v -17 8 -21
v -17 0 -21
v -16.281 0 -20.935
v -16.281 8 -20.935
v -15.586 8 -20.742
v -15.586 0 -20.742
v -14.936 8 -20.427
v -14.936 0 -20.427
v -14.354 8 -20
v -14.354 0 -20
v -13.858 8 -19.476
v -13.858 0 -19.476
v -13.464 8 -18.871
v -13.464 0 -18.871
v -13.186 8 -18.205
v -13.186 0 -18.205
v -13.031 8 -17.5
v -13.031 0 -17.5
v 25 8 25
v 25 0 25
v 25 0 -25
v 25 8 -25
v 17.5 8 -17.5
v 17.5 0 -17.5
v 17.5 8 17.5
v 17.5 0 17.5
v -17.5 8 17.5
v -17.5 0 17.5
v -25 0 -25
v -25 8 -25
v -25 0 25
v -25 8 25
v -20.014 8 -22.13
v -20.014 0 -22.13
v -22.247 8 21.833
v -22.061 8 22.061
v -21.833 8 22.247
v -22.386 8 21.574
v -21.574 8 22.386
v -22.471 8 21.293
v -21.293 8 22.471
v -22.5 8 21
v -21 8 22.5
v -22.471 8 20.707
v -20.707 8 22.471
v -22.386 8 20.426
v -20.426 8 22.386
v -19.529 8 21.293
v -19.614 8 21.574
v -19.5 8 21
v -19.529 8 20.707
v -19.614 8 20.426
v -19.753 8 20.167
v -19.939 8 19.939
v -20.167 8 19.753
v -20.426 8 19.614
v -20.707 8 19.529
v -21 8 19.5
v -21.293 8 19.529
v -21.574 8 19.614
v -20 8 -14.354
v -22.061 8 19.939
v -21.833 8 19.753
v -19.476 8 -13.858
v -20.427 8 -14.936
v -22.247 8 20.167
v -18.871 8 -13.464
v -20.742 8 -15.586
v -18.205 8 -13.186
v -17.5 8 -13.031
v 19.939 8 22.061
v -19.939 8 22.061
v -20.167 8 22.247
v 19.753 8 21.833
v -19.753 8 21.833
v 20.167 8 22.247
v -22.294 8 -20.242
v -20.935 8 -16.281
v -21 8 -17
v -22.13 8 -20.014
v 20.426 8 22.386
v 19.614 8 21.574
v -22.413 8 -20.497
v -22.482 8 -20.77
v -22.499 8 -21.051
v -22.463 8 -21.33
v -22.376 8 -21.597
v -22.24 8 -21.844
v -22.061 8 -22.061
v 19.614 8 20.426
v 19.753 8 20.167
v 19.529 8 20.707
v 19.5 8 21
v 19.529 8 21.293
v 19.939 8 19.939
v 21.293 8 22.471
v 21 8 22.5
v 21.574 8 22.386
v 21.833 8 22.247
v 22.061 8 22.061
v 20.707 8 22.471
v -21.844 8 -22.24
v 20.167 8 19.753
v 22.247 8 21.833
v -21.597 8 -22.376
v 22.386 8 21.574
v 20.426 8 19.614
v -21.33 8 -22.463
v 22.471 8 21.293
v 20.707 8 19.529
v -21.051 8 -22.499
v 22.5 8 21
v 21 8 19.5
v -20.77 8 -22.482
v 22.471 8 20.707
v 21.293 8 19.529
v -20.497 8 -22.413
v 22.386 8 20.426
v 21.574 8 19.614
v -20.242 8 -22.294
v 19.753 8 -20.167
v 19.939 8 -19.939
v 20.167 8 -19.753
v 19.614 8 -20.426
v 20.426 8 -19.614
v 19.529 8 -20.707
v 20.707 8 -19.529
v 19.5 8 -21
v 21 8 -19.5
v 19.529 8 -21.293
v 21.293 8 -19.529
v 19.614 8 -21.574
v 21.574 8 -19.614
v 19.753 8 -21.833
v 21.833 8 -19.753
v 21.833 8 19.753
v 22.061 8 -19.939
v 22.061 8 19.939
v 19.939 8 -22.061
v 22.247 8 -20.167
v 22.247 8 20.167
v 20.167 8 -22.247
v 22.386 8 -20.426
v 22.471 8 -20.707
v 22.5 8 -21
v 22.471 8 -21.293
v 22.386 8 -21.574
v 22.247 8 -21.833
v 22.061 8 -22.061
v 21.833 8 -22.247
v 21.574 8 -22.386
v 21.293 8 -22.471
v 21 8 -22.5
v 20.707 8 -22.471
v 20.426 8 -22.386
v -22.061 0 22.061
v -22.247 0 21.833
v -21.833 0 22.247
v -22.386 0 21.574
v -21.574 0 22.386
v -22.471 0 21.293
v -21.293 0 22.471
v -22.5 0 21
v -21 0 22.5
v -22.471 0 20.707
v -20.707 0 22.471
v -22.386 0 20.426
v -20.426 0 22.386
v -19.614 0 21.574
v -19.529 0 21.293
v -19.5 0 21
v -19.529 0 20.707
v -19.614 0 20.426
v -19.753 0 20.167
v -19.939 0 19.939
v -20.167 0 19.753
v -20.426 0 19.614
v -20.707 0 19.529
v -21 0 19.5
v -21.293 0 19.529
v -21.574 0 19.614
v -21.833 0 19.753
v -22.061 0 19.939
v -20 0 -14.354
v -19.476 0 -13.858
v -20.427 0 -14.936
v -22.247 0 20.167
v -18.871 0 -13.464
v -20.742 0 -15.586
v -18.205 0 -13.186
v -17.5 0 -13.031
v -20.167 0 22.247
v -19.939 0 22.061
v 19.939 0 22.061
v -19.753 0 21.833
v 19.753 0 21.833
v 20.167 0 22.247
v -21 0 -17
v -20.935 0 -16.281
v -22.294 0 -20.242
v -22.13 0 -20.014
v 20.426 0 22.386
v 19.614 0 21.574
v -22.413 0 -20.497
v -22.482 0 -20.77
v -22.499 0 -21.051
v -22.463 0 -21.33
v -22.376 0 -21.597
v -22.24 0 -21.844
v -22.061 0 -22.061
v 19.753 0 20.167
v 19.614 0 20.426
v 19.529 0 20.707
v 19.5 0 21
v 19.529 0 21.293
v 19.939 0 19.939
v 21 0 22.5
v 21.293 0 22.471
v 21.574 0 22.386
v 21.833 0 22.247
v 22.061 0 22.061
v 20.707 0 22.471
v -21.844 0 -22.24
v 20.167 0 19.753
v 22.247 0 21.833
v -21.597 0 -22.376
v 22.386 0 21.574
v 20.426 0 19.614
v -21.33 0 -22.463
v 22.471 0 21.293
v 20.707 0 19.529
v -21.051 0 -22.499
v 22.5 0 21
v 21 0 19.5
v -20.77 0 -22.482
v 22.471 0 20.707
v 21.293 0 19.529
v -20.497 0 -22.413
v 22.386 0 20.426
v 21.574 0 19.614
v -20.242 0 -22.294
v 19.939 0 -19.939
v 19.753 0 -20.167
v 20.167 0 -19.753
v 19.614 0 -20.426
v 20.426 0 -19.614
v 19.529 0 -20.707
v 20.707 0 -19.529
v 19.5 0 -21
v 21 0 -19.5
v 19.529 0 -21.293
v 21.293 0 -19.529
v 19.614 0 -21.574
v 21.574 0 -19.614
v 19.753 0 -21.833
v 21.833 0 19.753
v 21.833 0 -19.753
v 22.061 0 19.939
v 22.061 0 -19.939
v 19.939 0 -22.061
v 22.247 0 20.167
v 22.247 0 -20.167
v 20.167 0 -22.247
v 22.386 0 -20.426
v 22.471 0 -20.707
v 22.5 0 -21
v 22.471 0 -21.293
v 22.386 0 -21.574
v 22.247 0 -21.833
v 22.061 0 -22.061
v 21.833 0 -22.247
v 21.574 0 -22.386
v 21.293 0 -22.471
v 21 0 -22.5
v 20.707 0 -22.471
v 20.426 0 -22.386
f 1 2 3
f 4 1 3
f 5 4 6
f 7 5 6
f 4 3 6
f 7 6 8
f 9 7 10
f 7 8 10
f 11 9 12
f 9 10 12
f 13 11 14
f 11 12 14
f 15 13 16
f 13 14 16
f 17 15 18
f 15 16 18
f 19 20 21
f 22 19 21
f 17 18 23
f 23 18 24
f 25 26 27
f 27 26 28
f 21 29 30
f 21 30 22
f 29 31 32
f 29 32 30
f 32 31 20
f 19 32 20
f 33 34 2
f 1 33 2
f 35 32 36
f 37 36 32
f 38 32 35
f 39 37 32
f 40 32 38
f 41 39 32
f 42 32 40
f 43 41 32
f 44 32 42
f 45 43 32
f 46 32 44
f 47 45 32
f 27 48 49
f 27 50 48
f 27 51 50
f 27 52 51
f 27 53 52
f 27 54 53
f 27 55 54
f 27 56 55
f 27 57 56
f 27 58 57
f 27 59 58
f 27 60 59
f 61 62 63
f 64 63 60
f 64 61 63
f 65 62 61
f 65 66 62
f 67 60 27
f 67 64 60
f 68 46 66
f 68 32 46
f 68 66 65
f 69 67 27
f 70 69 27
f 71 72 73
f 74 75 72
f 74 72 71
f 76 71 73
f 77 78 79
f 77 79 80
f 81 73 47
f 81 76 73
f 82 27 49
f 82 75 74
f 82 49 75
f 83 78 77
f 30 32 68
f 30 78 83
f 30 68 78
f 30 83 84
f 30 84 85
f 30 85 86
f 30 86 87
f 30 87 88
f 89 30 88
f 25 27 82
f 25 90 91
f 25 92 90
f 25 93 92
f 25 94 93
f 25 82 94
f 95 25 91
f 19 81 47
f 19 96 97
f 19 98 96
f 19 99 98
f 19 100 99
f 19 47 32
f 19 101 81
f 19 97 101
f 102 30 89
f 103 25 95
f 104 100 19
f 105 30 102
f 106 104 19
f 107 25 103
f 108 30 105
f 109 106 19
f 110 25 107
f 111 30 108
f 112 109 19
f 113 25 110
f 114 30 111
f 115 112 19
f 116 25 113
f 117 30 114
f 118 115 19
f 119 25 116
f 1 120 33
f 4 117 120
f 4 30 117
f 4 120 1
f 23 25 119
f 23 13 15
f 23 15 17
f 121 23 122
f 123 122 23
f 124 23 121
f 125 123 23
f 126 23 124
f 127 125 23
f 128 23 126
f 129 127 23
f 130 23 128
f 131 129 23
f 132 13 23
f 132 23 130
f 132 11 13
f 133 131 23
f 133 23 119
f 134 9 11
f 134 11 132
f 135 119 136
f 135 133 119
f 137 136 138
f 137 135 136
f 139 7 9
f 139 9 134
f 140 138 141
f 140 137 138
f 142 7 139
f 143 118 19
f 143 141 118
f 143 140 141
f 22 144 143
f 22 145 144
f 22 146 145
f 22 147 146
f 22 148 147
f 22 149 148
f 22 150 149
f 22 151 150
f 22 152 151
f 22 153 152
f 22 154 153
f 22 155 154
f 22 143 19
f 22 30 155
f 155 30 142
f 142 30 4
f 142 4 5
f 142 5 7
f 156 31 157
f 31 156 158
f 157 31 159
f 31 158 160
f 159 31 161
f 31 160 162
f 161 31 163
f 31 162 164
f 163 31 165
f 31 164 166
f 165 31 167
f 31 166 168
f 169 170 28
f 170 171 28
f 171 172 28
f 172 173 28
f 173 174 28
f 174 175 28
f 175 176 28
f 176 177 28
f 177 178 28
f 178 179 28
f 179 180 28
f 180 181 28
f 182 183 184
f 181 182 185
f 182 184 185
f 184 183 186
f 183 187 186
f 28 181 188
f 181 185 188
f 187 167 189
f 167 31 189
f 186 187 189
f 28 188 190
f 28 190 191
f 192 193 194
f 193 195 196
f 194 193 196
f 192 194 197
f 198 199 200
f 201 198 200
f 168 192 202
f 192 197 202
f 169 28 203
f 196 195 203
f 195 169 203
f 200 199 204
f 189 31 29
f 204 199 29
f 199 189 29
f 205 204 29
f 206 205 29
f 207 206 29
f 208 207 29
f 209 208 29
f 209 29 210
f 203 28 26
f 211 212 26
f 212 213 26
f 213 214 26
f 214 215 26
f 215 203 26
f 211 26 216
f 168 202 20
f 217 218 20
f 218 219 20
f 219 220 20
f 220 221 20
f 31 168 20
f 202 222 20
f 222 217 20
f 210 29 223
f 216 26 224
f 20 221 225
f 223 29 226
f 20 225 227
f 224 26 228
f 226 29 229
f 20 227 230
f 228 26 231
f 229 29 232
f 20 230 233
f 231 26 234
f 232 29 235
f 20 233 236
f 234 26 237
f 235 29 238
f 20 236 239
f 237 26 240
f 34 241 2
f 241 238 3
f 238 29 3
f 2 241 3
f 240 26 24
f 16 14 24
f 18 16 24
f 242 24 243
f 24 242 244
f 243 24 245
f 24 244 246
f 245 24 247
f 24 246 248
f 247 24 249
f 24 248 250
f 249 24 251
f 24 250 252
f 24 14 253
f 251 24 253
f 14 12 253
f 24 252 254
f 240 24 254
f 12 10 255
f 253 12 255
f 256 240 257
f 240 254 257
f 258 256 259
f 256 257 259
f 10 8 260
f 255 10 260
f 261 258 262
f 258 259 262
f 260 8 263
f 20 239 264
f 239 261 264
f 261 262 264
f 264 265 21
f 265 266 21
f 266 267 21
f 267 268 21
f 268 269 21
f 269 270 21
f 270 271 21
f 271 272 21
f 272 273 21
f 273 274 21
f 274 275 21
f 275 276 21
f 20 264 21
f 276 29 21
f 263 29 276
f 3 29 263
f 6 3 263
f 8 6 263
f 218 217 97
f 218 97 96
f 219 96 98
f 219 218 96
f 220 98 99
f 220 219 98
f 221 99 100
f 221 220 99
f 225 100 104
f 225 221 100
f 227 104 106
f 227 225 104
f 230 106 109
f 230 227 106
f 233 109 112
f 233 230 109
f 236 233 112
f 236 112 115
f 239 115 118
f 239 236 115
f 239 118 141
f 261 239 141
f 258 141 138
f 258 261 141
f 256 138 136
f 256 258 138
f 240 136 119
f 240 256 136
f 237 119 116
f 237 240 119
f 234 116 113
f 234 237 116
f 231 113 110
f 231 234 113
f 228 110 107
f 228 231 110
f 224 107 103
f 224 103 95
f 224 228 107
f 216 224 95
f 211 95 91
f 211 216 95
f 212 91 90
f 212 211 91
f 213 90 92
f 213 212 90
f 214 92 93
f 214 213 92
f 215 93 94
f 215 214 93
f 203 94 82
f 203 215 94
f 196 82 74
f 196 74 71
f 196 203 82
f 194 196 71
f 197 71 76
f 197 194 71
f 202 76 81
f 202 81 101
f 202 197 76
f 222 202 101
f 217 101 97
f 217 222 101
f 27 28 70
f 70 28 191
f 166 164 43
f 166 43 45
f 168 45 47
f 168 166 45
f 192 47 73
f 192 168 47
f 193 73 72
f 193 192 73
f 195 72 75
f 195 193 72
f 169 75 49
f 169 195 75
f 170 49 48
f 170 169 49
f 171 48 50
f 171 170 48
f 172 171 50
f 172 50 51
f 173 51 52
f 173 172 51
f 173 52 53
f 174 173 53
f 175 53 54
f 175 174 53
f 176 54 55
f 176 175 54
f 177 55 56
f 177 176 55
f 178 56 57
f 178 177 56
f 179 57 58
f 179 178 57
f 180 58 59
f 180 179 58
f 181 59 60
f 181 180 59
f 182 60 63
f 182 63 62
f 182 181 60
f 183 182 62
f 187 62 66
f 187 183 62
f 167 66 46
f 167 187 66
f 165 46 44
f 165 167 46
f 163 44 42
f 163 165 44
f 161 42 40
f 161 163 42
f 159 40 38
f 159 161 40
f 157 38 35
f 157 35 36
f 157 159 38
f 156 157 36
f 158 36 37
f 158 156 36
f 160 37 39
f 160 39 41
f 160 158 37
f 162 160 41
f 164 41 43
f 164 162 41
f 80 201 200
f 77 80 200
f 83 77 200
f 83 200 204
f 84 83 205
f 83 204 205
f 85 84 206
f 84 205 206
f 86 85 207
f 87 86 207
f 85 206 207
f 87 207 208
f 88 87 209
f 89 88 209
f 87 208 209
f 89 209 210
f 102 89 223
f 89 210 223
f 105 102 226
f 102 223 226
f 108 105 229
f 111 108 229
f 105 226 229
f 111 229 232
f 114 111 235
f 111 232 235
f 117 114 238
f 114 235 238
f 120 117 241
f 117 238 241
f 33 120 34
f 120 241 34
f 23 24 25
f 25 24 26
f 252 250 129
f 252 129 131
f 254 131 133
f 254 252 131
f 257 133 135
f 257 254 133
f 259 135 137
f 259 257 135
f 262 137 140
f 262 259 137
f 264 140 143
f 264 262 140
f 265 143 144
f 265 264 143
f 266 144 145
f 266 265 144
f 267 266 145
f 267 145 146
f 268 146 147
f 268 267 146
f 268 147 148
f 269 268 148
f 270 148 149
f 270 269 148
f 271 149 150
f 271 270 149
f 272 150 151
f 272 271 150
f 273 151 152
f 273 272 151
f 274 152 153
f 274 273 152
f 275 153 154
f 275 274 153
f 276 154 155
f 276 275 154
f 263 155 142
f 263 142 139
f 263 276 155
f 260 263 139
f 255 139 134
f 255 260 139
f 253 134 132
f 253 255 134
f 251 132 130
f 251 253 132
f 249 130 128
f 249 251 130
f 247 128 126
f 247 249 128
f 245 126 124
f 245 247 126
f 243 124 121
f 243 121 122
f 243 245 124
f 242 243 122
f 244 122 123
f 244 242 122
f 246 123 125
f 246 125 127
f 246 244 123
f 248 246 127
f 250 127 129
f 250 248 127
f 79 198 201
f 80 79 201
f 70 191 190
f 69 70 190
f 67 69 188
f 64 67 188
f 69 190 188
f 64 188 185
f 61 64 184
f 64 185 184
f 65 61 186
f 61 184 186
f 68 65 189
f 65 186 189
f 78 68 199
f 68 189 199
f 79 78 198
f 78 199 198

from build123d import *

# Parameters (mm, degrees)
SKETCH1_W     = 50
SKETCH1_H     = 50
SKETCH1_R     = 1.5
SUPPORT_DEPTH = 8


with BuildPart() as part:
    # Sketch1 → Support (new body)
    with BuildSketch(Plane(origin=(0, 0, 0), x_dir=(1, 0, 0), z_dir=(0, 1, 0))):
        Rectangle(SKETCH1_W, SKETCH1_H)
        with Locations(Location((-21, -21, 0), (0, 0, 270))):
            Circle(SKETCH1_R, mode=Mode.SUBTRACT)
        with Locations(Location((21, -21, 0), (0, 0, 270))):
            Circle(SKETCH1_R, mode=Mode.SUBTRACT)
        with BuildLine():
            Line((-13.031373033, 17.5), (17.5, 17.5))
            Line((17.5, 17.5), (17.5, -17.5))
            Line((17.5, -17.5), (-17.5, -17.5))
            Line((-17.5, -17.5), (-17.5, 13.031373033))
            ThreePointArc((-17.5, 13.031373033), (-20, 14.354248689), (-21, 17))
            Line((-21, 17), (-22.130136986, 20.01369863))
            ThreePointArc((-22.130136986, 20.01369863), (-22.060660172, 22.060660172), (-20.01369863, 22.130136986))
            Line((-20.01369863, 22.130136986), (-17, 21))
            ThreePointArc((-17, 21), (-14.354248689, 20), (-13.031373033, 17.5))
        make_face(mode=Mode.SUBTRACT)
        with Locations(Location((21, 21, 0), (0, 0, 270))):
            Circle(SKETCH1_R, mode=Mode.SUBTRACT)
    extrude(amount=SUPPORT_DEPTH)


solid = part.part
